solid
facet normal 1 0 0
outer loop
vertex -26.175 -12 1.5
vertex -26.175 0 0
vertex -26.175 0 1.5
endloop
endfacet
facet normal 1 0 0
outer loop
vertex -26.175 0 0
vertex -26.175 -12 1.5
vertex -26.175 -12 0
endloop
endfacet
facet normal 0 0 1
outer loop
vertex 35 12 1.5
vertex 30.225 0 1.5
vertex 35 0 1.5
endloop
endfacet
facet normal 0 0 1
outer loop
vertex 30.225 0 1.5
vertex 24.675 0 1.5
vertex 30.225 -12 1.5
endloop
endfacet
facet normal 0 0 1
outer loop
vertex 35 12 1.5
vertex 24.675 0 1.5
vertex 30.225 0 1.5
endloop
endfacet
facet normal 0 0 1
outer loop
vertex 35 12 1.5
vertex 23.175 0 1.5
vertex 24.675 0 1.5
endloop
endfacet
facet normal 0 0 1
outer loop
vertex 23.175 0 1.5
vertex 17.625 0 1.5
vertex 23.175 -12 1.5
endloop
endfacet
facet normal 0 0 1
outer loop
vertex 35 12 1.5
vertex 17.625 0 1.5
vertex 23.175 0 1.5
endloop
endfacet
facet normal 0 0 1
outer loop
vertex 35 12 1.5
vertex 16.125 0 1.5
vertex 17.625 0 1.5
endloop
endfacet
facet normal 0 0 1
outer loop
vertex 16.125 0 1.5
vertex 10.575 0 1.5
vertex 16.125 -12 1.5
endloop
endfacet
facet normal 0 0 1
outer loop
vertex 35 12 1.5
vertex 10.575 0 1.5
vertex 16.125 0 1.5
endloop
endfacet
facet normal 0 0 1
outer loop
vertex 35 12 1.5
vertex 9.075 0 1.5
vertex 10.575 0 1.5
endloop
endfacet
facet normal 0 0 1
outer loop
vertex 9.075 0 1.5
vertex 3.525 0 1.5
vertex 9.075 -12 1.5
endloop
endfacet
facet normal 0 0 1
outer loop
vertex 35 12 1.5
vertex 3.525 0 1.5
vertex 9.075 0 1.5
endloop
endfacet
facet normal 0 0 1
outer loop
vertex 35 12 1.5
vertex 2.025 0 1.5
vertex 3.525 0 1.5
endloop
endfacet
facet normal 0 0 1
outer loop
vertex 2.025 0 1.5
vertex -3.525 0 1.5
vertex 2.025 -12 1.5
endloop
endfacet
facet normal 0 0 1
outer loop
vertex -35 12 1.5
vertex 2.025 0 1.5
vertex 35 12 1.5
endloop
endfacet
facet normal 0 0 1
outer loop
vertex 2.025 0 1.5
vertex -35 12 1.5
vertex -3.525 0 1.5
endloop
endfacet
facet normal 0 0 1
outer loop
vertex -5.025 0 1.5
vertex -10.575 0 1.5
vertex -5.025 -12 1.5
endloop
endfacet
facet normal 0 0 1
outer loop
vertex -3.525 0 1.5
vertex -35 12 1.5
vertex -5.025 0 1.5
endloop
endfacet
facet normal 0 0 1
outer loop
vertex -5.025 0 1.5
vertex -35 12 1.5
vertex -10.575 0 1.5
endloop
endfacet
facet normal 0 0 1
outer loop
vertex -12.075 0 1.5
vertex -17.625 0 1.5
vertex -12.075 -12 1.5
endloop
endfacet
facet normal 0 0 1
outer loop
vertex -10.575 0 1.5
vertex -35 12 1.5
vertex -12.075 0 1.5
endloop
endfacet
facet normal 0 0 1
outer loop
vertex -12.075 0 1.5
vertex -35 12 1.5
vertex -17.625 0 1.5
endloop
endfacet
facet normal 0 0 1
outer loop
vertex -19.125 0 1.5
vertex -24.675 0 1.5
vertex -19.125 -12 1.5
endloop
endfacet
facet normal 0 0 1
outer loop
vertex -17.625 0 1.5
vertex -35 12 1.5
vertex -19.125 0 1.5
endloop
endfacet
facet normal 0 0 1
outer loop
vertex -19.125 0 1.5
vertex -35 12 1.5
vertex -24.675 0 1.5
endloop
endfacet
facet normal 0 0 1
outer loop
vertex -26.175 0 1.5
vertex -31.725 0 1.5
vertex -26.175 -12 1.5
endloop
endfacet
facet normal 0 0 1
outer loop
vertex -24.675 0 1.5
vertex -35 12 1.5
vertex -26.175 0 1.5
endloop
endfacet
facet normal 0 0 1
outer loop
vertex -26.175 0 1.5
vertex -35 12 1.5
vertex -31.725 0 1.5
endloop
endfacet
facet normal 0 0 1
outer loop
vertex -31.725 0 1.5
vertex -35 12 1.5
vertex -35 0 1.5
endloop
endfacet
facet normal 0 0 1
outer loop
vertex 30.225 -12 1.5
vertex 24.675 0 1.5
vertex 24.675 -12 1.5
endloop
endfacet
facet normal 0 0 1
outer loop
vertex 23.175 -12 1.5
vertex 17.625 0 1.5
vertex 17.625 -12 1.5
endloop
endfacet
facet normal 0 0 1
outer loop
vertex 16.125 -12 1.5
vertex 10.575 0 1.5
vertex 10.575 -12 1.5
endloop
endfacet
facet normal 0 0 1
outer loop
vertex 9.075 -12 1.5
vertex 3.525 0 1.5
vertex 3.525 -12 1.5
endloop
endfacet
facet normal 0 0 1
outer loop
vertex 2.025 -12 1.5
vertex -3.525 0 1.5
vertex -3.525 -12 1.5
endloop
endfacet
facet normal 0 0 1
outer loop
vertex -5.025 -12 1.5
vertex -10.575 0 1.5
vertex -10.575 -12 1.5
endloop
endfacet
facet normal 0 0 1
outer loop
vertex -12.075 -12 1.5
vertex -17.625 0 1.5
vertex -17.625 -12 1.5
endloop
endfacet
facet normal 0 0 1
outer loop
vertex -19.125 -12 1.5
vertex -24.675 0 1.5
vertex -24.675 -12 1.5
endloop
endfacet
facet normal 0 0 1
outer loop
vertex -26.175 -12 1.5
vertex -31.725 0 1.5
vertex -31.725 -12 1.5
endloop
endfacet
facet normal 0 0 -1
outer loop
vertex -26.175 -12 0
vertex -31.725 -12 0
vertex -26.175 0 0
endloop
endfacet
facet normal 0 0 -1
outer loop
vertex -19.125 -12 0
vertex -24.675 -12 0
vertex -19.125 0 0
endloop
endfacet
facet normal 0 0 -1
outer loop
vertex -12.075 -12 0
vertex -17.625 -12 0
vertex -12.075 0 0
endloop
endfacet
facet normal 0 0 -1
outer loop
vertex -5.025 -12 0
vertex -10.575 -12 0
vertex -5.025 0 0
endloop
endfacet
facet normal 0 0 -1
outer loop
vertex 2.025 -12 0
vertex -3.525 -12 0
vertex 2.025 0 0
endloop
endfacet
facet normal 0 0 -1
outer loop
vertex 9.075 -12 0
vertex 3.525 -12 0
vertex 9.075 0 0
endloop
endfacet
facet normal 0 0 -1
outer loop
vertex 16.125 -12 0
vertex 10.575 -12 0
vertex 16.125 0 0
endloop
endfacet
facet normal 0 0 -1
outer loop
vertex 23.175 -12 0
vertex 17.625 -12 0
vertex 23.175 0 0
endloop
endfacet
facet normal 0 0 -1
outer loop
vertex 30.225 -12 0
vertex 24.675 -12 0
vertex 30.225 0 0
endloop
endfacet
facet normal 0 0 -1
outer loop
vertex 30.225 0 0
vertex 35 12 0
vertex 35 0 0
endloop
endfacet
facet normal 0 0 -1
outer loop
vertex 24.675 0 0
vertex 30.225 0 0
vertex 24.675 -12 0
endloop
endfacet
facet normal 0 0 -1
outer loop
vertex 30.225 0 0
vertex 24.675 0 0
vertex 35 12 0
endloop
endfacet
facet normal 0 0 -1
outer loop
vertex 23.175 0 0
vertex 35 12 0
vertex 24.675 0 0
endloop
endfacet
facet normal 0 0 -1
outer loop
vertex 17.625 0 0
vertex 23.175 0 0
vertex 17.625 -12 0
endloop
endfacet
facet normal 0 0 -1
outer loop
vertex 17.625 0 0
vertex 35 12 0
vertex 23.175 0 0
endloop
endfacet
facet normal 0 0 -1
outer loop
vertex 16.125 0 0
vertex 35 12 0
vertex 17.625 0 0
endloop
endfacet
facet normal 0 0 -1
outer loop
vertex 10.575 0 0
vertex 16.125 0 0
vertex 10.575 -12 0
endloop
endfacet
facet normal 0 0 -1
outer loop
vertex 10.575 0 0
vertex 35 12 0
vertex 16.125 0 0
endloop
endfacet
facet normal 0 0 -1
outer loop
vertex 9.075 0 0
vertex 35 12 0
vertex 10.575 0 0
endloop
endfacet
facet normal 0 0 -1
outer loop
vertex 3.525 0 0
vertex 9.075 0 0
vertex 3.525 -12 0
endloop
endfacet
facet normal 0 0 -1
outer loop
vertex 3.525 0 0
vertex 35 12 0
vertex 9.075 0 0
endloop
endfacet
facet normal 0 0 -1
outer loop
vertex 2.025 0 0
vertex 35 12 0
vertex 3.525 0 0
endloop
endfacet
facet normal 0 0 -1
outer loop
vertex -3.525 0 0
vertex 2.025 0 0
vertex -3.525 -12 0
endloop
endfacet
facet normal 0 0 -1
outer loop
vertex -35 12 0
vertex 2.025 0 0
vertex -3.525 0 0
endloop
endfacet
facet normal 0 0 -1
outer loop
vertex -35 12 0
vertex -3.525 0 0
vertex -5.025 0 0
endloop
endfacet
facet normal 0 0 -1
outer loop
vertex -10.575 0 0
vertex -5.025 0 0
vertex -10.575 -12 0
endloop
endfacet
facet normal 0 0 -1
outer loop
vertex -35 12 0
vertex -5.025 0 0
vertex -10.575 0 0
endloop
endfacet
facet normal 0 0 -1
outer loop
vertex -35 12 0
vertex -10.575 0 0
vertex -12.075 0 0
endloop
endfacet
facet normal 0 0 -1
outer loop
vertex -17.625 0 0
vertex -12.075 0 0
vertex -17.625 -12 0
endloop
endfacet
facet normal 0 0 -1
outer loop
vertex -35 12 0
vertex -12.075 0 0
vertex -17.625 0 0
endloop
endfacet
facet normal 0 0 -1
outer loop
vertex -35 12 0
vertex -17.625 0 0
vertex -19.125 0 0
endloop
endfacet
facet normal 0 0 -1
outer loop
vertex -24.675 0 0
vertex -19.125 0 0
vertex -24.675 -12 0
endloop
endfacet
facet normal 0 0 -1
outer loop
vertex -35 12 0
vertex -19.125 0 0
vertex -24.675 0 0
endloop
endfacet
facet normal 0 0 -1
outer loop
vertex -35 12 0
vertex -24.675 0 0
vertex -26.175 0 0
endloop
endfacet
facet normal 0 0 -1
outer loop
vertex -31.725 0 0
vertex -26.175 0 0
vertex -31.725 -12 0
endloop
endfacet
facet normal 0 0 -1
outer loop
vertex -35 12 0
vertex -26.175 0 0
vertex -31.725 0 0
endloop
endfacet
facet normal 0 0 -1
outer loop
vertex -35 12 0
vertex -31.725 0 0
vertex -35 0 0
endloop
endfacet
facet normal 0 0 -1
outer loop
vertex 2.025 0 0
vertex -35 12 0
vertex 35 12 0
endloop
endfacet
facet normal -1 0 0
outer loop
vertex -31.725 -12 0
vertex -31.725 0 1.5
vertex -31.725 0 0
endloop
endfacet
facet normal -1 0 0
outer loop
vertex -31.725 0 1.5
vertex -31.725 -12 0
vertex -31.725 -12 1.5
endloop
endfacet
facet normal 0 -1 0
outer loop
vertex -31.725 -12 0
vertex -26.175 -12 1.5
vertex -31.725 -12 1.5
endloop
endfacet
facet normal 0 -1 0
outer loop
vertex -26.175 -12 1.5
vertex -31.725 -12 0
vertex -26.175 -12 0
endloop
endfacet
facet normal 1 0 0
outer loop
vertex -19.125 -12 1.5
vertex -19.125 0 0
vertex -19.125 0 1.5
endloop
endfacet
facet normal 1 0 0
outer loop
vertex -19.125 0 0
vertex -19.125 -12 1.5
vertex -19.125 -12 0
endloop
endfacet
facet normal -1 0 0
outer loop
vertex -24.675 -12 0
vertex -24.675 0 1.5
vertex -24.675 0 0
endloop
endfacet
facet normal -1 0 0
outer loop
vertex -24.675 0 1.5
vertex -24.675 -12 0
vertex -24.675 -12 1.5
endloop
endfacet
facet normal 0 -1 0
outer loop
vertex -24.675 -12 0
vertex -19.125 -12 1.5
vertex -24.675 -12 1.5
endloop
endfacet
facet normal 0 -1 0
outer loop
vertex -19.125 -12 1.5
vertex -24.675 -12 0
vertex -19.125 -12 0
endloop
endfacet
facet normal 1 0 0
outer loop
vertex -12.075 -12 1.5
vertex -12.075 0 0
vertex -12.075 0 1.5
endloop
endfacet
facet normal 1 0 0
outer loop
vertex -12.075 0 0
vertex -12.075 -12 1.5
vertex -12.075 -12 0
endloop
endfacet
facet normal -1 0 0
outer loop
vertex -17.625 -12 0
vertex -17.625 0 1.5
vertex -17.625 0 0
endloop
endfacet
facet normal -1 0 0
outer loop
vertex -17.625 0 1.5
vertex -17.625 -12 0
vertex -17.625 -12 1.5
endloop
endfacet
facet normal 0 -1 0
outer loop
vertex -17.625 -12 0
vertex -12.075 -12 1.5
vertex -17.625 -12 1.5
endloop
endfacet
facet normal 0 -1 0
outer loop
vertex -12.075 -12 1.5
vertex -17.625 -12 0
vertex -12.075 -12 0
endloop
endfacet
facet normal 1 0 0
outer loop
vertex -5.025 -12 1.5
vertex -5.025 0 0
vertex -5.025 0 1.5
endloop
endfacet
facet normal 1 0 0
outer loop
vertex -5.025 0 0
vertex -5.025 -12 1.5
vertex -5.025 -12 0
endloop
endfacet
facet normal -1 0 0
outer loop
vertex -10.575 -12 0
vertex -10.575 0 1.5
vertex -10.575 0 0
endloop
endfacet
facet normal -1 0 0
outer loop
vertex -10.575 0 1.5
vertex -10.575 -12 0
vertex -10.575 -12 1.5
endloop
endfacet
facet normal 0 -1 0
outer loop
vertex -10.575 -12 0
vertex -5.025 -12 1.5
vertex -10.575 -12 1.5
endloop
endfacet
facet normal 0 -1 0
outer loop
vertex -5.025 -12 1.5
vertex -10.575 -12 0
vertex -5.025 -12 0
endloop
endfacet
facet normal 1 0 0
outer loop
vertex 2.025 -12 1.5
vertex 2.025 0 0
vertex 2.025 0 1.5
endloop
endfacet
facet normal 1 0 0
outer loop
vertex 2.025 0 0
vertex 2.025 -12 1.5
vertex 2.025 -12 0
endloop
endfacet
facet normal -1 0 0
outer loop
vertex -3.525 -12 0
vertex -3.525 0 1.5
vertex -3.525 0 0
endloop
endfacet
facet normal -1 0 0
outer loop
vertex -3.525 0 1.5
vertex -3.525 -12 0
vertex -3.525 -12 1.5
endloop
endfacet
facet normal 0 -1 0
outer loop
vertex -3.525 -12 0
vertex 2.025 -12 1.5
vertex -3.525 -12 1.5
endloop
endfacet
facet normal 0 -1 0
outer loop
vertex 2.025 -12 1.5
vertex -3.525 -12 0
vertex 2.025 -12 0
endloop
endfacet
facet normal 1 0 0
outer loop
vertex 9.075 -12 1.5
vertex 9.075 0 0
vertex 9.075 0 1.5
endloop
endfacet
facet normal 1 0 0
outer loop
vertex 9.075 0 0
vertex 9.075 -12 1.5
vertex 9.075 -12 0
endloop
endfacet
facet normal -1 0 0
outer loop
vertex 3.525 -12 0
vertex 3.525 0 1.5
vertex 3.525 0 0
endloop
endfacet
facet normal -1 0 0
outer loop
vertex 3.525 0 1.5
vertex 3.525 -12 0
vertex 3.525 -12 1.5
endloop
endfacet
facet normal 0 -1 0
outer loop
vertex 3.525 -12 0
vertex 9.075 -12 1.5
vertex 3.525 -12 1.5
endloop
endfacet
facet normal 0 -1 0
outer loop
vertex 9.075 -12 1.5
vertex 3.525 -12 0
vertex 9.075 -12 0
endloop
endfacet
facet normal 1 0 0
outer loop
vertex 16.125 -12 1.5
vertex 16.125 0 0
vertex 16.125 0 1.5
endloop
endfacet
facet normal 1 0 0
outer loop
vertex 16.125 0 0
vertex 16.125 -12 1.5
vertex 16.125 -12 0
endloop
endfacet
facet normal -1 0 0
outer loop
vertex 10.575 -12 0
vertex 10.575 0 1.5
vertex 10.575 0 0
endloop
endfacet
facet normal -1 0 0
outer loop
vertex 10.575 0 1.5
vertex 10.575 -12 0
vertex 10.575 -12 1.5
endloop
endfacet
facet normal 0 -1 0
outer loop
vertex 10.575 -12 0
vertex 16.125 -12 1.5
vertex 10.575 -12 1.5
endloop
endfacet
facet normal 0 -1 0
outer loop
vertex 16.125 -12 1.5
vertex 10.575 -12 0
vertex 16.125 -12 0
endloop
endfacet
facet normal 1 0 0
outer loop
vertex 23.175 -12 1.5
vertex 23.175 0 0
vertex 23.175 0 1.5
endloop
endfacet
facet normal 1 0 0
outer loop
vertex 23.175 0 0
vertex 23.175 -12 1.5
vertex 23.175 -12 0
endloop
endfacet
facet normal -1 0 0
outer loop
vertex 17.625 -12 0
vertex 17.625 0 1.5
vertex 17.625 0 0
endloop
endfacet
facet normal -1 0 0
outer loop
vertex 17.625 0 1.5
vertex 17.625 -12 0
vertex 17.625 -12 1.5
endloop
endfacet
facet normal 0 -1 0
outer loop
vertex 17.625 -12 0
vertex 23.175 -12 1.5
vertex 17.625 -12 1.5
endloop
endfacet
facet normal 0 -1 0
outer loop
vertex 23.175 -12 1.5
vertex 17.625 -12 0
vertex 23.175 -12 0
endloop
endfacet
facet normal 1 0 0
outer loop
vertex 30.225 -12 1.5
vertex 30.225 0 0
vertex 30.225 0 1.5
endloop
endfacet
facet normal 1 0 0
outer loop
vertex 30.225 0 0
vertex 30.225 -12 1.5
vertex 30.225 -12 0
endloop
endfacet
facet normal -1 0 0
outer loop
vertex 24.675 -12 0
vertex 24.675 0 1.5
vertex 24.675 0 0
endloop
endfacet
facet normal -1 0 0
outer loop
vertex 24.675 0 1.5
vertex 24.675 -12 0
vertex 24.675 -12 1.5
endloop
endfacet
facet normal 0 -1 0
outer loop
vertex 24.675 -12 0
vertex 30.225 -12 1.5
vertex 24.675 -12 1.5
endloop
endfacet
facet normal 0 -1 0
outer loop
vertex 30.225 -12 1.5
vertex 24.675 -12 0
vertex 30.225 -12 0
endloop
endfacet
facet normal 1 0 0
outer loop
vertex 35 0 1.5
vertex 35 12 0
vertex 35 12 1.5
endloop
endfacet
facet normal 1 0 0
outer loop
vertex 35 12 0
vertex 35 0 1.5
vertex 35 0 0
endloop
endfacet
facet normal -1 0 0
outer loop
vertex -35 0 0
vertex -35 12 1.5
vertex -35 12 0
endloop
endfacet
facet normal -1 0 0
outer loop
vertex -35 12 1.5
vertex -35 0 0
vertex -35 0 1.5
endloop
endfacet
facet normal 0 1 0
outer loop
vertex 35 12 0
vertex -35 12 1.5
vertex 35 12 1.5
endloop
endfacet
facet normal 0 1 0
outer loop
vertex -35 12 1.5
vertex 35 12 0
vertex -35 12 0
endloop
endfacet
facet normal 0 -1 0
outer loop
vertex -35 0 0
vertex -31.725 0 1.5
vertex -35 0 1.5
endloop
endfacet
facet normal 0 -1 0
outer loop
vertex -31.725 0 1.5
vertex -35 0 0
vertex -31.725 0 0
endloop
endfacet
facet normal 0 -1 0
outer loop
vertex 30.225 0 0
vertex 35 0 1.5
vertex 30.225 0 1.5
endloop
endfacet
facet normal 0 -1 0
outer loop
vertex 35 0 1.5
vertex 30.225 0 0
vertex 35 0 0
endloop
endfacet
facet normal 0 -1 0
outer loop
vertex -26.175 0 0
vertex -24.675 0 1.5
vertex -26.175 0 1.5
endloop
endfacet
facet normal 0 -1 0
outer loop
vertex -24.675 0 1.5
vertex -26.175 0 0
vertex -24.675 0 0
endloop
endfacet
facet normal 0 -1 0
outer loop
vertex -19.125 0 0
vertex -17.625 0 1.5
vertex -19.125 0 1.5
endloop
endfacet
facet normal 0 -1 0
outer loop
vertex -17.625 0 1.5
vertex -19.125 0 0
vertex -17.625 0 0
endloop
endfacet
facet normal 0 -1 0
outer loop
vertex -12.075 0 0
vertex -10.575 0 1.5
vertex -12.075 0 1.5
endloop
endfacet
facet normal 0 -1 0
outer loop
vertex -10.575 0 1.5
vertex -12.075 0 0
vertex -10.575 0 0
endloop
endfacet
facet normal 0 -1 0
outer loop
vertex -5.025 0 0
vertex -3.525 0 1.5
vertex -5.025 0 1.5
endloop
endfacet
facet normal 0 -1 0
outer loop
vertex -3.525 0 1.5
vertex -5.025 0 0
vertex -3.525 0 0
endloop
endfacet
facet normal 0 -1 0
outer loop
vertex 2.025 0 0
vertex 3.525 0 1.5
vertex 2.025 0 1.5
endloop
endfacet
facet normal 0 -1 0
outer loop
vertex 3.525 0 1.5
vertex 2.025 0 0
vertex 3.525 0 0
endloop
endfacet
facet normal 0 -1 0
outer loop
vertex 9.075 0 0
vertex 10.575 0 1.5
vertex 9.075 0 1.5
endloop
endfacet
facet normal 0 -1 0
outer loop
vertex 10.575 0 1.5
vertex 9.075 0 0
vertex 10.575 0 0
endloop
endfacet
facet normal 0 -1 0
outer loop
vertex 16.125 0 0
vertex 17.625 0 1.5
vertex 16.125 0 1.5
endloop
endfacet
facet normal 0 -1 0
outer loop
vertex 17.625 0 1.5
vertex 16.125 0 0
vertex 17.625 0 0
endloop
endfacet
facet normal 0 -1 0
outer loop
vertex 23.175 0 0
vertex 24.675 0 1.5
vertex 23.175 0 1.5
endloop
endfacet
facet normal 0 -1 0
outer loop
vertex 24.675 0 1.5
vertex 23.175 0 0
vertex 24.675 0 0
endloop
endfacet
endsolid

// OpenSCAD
// only 9 teeth, 5.55 mm wide each, 1.5 mm gaps
translate([-35,0,0]) cube([70,12,1.5]);
for (i=[0:8]) translate([-31.725 + i*7.05, -12, 0]) cube([5.55,12.01,1.5]);
